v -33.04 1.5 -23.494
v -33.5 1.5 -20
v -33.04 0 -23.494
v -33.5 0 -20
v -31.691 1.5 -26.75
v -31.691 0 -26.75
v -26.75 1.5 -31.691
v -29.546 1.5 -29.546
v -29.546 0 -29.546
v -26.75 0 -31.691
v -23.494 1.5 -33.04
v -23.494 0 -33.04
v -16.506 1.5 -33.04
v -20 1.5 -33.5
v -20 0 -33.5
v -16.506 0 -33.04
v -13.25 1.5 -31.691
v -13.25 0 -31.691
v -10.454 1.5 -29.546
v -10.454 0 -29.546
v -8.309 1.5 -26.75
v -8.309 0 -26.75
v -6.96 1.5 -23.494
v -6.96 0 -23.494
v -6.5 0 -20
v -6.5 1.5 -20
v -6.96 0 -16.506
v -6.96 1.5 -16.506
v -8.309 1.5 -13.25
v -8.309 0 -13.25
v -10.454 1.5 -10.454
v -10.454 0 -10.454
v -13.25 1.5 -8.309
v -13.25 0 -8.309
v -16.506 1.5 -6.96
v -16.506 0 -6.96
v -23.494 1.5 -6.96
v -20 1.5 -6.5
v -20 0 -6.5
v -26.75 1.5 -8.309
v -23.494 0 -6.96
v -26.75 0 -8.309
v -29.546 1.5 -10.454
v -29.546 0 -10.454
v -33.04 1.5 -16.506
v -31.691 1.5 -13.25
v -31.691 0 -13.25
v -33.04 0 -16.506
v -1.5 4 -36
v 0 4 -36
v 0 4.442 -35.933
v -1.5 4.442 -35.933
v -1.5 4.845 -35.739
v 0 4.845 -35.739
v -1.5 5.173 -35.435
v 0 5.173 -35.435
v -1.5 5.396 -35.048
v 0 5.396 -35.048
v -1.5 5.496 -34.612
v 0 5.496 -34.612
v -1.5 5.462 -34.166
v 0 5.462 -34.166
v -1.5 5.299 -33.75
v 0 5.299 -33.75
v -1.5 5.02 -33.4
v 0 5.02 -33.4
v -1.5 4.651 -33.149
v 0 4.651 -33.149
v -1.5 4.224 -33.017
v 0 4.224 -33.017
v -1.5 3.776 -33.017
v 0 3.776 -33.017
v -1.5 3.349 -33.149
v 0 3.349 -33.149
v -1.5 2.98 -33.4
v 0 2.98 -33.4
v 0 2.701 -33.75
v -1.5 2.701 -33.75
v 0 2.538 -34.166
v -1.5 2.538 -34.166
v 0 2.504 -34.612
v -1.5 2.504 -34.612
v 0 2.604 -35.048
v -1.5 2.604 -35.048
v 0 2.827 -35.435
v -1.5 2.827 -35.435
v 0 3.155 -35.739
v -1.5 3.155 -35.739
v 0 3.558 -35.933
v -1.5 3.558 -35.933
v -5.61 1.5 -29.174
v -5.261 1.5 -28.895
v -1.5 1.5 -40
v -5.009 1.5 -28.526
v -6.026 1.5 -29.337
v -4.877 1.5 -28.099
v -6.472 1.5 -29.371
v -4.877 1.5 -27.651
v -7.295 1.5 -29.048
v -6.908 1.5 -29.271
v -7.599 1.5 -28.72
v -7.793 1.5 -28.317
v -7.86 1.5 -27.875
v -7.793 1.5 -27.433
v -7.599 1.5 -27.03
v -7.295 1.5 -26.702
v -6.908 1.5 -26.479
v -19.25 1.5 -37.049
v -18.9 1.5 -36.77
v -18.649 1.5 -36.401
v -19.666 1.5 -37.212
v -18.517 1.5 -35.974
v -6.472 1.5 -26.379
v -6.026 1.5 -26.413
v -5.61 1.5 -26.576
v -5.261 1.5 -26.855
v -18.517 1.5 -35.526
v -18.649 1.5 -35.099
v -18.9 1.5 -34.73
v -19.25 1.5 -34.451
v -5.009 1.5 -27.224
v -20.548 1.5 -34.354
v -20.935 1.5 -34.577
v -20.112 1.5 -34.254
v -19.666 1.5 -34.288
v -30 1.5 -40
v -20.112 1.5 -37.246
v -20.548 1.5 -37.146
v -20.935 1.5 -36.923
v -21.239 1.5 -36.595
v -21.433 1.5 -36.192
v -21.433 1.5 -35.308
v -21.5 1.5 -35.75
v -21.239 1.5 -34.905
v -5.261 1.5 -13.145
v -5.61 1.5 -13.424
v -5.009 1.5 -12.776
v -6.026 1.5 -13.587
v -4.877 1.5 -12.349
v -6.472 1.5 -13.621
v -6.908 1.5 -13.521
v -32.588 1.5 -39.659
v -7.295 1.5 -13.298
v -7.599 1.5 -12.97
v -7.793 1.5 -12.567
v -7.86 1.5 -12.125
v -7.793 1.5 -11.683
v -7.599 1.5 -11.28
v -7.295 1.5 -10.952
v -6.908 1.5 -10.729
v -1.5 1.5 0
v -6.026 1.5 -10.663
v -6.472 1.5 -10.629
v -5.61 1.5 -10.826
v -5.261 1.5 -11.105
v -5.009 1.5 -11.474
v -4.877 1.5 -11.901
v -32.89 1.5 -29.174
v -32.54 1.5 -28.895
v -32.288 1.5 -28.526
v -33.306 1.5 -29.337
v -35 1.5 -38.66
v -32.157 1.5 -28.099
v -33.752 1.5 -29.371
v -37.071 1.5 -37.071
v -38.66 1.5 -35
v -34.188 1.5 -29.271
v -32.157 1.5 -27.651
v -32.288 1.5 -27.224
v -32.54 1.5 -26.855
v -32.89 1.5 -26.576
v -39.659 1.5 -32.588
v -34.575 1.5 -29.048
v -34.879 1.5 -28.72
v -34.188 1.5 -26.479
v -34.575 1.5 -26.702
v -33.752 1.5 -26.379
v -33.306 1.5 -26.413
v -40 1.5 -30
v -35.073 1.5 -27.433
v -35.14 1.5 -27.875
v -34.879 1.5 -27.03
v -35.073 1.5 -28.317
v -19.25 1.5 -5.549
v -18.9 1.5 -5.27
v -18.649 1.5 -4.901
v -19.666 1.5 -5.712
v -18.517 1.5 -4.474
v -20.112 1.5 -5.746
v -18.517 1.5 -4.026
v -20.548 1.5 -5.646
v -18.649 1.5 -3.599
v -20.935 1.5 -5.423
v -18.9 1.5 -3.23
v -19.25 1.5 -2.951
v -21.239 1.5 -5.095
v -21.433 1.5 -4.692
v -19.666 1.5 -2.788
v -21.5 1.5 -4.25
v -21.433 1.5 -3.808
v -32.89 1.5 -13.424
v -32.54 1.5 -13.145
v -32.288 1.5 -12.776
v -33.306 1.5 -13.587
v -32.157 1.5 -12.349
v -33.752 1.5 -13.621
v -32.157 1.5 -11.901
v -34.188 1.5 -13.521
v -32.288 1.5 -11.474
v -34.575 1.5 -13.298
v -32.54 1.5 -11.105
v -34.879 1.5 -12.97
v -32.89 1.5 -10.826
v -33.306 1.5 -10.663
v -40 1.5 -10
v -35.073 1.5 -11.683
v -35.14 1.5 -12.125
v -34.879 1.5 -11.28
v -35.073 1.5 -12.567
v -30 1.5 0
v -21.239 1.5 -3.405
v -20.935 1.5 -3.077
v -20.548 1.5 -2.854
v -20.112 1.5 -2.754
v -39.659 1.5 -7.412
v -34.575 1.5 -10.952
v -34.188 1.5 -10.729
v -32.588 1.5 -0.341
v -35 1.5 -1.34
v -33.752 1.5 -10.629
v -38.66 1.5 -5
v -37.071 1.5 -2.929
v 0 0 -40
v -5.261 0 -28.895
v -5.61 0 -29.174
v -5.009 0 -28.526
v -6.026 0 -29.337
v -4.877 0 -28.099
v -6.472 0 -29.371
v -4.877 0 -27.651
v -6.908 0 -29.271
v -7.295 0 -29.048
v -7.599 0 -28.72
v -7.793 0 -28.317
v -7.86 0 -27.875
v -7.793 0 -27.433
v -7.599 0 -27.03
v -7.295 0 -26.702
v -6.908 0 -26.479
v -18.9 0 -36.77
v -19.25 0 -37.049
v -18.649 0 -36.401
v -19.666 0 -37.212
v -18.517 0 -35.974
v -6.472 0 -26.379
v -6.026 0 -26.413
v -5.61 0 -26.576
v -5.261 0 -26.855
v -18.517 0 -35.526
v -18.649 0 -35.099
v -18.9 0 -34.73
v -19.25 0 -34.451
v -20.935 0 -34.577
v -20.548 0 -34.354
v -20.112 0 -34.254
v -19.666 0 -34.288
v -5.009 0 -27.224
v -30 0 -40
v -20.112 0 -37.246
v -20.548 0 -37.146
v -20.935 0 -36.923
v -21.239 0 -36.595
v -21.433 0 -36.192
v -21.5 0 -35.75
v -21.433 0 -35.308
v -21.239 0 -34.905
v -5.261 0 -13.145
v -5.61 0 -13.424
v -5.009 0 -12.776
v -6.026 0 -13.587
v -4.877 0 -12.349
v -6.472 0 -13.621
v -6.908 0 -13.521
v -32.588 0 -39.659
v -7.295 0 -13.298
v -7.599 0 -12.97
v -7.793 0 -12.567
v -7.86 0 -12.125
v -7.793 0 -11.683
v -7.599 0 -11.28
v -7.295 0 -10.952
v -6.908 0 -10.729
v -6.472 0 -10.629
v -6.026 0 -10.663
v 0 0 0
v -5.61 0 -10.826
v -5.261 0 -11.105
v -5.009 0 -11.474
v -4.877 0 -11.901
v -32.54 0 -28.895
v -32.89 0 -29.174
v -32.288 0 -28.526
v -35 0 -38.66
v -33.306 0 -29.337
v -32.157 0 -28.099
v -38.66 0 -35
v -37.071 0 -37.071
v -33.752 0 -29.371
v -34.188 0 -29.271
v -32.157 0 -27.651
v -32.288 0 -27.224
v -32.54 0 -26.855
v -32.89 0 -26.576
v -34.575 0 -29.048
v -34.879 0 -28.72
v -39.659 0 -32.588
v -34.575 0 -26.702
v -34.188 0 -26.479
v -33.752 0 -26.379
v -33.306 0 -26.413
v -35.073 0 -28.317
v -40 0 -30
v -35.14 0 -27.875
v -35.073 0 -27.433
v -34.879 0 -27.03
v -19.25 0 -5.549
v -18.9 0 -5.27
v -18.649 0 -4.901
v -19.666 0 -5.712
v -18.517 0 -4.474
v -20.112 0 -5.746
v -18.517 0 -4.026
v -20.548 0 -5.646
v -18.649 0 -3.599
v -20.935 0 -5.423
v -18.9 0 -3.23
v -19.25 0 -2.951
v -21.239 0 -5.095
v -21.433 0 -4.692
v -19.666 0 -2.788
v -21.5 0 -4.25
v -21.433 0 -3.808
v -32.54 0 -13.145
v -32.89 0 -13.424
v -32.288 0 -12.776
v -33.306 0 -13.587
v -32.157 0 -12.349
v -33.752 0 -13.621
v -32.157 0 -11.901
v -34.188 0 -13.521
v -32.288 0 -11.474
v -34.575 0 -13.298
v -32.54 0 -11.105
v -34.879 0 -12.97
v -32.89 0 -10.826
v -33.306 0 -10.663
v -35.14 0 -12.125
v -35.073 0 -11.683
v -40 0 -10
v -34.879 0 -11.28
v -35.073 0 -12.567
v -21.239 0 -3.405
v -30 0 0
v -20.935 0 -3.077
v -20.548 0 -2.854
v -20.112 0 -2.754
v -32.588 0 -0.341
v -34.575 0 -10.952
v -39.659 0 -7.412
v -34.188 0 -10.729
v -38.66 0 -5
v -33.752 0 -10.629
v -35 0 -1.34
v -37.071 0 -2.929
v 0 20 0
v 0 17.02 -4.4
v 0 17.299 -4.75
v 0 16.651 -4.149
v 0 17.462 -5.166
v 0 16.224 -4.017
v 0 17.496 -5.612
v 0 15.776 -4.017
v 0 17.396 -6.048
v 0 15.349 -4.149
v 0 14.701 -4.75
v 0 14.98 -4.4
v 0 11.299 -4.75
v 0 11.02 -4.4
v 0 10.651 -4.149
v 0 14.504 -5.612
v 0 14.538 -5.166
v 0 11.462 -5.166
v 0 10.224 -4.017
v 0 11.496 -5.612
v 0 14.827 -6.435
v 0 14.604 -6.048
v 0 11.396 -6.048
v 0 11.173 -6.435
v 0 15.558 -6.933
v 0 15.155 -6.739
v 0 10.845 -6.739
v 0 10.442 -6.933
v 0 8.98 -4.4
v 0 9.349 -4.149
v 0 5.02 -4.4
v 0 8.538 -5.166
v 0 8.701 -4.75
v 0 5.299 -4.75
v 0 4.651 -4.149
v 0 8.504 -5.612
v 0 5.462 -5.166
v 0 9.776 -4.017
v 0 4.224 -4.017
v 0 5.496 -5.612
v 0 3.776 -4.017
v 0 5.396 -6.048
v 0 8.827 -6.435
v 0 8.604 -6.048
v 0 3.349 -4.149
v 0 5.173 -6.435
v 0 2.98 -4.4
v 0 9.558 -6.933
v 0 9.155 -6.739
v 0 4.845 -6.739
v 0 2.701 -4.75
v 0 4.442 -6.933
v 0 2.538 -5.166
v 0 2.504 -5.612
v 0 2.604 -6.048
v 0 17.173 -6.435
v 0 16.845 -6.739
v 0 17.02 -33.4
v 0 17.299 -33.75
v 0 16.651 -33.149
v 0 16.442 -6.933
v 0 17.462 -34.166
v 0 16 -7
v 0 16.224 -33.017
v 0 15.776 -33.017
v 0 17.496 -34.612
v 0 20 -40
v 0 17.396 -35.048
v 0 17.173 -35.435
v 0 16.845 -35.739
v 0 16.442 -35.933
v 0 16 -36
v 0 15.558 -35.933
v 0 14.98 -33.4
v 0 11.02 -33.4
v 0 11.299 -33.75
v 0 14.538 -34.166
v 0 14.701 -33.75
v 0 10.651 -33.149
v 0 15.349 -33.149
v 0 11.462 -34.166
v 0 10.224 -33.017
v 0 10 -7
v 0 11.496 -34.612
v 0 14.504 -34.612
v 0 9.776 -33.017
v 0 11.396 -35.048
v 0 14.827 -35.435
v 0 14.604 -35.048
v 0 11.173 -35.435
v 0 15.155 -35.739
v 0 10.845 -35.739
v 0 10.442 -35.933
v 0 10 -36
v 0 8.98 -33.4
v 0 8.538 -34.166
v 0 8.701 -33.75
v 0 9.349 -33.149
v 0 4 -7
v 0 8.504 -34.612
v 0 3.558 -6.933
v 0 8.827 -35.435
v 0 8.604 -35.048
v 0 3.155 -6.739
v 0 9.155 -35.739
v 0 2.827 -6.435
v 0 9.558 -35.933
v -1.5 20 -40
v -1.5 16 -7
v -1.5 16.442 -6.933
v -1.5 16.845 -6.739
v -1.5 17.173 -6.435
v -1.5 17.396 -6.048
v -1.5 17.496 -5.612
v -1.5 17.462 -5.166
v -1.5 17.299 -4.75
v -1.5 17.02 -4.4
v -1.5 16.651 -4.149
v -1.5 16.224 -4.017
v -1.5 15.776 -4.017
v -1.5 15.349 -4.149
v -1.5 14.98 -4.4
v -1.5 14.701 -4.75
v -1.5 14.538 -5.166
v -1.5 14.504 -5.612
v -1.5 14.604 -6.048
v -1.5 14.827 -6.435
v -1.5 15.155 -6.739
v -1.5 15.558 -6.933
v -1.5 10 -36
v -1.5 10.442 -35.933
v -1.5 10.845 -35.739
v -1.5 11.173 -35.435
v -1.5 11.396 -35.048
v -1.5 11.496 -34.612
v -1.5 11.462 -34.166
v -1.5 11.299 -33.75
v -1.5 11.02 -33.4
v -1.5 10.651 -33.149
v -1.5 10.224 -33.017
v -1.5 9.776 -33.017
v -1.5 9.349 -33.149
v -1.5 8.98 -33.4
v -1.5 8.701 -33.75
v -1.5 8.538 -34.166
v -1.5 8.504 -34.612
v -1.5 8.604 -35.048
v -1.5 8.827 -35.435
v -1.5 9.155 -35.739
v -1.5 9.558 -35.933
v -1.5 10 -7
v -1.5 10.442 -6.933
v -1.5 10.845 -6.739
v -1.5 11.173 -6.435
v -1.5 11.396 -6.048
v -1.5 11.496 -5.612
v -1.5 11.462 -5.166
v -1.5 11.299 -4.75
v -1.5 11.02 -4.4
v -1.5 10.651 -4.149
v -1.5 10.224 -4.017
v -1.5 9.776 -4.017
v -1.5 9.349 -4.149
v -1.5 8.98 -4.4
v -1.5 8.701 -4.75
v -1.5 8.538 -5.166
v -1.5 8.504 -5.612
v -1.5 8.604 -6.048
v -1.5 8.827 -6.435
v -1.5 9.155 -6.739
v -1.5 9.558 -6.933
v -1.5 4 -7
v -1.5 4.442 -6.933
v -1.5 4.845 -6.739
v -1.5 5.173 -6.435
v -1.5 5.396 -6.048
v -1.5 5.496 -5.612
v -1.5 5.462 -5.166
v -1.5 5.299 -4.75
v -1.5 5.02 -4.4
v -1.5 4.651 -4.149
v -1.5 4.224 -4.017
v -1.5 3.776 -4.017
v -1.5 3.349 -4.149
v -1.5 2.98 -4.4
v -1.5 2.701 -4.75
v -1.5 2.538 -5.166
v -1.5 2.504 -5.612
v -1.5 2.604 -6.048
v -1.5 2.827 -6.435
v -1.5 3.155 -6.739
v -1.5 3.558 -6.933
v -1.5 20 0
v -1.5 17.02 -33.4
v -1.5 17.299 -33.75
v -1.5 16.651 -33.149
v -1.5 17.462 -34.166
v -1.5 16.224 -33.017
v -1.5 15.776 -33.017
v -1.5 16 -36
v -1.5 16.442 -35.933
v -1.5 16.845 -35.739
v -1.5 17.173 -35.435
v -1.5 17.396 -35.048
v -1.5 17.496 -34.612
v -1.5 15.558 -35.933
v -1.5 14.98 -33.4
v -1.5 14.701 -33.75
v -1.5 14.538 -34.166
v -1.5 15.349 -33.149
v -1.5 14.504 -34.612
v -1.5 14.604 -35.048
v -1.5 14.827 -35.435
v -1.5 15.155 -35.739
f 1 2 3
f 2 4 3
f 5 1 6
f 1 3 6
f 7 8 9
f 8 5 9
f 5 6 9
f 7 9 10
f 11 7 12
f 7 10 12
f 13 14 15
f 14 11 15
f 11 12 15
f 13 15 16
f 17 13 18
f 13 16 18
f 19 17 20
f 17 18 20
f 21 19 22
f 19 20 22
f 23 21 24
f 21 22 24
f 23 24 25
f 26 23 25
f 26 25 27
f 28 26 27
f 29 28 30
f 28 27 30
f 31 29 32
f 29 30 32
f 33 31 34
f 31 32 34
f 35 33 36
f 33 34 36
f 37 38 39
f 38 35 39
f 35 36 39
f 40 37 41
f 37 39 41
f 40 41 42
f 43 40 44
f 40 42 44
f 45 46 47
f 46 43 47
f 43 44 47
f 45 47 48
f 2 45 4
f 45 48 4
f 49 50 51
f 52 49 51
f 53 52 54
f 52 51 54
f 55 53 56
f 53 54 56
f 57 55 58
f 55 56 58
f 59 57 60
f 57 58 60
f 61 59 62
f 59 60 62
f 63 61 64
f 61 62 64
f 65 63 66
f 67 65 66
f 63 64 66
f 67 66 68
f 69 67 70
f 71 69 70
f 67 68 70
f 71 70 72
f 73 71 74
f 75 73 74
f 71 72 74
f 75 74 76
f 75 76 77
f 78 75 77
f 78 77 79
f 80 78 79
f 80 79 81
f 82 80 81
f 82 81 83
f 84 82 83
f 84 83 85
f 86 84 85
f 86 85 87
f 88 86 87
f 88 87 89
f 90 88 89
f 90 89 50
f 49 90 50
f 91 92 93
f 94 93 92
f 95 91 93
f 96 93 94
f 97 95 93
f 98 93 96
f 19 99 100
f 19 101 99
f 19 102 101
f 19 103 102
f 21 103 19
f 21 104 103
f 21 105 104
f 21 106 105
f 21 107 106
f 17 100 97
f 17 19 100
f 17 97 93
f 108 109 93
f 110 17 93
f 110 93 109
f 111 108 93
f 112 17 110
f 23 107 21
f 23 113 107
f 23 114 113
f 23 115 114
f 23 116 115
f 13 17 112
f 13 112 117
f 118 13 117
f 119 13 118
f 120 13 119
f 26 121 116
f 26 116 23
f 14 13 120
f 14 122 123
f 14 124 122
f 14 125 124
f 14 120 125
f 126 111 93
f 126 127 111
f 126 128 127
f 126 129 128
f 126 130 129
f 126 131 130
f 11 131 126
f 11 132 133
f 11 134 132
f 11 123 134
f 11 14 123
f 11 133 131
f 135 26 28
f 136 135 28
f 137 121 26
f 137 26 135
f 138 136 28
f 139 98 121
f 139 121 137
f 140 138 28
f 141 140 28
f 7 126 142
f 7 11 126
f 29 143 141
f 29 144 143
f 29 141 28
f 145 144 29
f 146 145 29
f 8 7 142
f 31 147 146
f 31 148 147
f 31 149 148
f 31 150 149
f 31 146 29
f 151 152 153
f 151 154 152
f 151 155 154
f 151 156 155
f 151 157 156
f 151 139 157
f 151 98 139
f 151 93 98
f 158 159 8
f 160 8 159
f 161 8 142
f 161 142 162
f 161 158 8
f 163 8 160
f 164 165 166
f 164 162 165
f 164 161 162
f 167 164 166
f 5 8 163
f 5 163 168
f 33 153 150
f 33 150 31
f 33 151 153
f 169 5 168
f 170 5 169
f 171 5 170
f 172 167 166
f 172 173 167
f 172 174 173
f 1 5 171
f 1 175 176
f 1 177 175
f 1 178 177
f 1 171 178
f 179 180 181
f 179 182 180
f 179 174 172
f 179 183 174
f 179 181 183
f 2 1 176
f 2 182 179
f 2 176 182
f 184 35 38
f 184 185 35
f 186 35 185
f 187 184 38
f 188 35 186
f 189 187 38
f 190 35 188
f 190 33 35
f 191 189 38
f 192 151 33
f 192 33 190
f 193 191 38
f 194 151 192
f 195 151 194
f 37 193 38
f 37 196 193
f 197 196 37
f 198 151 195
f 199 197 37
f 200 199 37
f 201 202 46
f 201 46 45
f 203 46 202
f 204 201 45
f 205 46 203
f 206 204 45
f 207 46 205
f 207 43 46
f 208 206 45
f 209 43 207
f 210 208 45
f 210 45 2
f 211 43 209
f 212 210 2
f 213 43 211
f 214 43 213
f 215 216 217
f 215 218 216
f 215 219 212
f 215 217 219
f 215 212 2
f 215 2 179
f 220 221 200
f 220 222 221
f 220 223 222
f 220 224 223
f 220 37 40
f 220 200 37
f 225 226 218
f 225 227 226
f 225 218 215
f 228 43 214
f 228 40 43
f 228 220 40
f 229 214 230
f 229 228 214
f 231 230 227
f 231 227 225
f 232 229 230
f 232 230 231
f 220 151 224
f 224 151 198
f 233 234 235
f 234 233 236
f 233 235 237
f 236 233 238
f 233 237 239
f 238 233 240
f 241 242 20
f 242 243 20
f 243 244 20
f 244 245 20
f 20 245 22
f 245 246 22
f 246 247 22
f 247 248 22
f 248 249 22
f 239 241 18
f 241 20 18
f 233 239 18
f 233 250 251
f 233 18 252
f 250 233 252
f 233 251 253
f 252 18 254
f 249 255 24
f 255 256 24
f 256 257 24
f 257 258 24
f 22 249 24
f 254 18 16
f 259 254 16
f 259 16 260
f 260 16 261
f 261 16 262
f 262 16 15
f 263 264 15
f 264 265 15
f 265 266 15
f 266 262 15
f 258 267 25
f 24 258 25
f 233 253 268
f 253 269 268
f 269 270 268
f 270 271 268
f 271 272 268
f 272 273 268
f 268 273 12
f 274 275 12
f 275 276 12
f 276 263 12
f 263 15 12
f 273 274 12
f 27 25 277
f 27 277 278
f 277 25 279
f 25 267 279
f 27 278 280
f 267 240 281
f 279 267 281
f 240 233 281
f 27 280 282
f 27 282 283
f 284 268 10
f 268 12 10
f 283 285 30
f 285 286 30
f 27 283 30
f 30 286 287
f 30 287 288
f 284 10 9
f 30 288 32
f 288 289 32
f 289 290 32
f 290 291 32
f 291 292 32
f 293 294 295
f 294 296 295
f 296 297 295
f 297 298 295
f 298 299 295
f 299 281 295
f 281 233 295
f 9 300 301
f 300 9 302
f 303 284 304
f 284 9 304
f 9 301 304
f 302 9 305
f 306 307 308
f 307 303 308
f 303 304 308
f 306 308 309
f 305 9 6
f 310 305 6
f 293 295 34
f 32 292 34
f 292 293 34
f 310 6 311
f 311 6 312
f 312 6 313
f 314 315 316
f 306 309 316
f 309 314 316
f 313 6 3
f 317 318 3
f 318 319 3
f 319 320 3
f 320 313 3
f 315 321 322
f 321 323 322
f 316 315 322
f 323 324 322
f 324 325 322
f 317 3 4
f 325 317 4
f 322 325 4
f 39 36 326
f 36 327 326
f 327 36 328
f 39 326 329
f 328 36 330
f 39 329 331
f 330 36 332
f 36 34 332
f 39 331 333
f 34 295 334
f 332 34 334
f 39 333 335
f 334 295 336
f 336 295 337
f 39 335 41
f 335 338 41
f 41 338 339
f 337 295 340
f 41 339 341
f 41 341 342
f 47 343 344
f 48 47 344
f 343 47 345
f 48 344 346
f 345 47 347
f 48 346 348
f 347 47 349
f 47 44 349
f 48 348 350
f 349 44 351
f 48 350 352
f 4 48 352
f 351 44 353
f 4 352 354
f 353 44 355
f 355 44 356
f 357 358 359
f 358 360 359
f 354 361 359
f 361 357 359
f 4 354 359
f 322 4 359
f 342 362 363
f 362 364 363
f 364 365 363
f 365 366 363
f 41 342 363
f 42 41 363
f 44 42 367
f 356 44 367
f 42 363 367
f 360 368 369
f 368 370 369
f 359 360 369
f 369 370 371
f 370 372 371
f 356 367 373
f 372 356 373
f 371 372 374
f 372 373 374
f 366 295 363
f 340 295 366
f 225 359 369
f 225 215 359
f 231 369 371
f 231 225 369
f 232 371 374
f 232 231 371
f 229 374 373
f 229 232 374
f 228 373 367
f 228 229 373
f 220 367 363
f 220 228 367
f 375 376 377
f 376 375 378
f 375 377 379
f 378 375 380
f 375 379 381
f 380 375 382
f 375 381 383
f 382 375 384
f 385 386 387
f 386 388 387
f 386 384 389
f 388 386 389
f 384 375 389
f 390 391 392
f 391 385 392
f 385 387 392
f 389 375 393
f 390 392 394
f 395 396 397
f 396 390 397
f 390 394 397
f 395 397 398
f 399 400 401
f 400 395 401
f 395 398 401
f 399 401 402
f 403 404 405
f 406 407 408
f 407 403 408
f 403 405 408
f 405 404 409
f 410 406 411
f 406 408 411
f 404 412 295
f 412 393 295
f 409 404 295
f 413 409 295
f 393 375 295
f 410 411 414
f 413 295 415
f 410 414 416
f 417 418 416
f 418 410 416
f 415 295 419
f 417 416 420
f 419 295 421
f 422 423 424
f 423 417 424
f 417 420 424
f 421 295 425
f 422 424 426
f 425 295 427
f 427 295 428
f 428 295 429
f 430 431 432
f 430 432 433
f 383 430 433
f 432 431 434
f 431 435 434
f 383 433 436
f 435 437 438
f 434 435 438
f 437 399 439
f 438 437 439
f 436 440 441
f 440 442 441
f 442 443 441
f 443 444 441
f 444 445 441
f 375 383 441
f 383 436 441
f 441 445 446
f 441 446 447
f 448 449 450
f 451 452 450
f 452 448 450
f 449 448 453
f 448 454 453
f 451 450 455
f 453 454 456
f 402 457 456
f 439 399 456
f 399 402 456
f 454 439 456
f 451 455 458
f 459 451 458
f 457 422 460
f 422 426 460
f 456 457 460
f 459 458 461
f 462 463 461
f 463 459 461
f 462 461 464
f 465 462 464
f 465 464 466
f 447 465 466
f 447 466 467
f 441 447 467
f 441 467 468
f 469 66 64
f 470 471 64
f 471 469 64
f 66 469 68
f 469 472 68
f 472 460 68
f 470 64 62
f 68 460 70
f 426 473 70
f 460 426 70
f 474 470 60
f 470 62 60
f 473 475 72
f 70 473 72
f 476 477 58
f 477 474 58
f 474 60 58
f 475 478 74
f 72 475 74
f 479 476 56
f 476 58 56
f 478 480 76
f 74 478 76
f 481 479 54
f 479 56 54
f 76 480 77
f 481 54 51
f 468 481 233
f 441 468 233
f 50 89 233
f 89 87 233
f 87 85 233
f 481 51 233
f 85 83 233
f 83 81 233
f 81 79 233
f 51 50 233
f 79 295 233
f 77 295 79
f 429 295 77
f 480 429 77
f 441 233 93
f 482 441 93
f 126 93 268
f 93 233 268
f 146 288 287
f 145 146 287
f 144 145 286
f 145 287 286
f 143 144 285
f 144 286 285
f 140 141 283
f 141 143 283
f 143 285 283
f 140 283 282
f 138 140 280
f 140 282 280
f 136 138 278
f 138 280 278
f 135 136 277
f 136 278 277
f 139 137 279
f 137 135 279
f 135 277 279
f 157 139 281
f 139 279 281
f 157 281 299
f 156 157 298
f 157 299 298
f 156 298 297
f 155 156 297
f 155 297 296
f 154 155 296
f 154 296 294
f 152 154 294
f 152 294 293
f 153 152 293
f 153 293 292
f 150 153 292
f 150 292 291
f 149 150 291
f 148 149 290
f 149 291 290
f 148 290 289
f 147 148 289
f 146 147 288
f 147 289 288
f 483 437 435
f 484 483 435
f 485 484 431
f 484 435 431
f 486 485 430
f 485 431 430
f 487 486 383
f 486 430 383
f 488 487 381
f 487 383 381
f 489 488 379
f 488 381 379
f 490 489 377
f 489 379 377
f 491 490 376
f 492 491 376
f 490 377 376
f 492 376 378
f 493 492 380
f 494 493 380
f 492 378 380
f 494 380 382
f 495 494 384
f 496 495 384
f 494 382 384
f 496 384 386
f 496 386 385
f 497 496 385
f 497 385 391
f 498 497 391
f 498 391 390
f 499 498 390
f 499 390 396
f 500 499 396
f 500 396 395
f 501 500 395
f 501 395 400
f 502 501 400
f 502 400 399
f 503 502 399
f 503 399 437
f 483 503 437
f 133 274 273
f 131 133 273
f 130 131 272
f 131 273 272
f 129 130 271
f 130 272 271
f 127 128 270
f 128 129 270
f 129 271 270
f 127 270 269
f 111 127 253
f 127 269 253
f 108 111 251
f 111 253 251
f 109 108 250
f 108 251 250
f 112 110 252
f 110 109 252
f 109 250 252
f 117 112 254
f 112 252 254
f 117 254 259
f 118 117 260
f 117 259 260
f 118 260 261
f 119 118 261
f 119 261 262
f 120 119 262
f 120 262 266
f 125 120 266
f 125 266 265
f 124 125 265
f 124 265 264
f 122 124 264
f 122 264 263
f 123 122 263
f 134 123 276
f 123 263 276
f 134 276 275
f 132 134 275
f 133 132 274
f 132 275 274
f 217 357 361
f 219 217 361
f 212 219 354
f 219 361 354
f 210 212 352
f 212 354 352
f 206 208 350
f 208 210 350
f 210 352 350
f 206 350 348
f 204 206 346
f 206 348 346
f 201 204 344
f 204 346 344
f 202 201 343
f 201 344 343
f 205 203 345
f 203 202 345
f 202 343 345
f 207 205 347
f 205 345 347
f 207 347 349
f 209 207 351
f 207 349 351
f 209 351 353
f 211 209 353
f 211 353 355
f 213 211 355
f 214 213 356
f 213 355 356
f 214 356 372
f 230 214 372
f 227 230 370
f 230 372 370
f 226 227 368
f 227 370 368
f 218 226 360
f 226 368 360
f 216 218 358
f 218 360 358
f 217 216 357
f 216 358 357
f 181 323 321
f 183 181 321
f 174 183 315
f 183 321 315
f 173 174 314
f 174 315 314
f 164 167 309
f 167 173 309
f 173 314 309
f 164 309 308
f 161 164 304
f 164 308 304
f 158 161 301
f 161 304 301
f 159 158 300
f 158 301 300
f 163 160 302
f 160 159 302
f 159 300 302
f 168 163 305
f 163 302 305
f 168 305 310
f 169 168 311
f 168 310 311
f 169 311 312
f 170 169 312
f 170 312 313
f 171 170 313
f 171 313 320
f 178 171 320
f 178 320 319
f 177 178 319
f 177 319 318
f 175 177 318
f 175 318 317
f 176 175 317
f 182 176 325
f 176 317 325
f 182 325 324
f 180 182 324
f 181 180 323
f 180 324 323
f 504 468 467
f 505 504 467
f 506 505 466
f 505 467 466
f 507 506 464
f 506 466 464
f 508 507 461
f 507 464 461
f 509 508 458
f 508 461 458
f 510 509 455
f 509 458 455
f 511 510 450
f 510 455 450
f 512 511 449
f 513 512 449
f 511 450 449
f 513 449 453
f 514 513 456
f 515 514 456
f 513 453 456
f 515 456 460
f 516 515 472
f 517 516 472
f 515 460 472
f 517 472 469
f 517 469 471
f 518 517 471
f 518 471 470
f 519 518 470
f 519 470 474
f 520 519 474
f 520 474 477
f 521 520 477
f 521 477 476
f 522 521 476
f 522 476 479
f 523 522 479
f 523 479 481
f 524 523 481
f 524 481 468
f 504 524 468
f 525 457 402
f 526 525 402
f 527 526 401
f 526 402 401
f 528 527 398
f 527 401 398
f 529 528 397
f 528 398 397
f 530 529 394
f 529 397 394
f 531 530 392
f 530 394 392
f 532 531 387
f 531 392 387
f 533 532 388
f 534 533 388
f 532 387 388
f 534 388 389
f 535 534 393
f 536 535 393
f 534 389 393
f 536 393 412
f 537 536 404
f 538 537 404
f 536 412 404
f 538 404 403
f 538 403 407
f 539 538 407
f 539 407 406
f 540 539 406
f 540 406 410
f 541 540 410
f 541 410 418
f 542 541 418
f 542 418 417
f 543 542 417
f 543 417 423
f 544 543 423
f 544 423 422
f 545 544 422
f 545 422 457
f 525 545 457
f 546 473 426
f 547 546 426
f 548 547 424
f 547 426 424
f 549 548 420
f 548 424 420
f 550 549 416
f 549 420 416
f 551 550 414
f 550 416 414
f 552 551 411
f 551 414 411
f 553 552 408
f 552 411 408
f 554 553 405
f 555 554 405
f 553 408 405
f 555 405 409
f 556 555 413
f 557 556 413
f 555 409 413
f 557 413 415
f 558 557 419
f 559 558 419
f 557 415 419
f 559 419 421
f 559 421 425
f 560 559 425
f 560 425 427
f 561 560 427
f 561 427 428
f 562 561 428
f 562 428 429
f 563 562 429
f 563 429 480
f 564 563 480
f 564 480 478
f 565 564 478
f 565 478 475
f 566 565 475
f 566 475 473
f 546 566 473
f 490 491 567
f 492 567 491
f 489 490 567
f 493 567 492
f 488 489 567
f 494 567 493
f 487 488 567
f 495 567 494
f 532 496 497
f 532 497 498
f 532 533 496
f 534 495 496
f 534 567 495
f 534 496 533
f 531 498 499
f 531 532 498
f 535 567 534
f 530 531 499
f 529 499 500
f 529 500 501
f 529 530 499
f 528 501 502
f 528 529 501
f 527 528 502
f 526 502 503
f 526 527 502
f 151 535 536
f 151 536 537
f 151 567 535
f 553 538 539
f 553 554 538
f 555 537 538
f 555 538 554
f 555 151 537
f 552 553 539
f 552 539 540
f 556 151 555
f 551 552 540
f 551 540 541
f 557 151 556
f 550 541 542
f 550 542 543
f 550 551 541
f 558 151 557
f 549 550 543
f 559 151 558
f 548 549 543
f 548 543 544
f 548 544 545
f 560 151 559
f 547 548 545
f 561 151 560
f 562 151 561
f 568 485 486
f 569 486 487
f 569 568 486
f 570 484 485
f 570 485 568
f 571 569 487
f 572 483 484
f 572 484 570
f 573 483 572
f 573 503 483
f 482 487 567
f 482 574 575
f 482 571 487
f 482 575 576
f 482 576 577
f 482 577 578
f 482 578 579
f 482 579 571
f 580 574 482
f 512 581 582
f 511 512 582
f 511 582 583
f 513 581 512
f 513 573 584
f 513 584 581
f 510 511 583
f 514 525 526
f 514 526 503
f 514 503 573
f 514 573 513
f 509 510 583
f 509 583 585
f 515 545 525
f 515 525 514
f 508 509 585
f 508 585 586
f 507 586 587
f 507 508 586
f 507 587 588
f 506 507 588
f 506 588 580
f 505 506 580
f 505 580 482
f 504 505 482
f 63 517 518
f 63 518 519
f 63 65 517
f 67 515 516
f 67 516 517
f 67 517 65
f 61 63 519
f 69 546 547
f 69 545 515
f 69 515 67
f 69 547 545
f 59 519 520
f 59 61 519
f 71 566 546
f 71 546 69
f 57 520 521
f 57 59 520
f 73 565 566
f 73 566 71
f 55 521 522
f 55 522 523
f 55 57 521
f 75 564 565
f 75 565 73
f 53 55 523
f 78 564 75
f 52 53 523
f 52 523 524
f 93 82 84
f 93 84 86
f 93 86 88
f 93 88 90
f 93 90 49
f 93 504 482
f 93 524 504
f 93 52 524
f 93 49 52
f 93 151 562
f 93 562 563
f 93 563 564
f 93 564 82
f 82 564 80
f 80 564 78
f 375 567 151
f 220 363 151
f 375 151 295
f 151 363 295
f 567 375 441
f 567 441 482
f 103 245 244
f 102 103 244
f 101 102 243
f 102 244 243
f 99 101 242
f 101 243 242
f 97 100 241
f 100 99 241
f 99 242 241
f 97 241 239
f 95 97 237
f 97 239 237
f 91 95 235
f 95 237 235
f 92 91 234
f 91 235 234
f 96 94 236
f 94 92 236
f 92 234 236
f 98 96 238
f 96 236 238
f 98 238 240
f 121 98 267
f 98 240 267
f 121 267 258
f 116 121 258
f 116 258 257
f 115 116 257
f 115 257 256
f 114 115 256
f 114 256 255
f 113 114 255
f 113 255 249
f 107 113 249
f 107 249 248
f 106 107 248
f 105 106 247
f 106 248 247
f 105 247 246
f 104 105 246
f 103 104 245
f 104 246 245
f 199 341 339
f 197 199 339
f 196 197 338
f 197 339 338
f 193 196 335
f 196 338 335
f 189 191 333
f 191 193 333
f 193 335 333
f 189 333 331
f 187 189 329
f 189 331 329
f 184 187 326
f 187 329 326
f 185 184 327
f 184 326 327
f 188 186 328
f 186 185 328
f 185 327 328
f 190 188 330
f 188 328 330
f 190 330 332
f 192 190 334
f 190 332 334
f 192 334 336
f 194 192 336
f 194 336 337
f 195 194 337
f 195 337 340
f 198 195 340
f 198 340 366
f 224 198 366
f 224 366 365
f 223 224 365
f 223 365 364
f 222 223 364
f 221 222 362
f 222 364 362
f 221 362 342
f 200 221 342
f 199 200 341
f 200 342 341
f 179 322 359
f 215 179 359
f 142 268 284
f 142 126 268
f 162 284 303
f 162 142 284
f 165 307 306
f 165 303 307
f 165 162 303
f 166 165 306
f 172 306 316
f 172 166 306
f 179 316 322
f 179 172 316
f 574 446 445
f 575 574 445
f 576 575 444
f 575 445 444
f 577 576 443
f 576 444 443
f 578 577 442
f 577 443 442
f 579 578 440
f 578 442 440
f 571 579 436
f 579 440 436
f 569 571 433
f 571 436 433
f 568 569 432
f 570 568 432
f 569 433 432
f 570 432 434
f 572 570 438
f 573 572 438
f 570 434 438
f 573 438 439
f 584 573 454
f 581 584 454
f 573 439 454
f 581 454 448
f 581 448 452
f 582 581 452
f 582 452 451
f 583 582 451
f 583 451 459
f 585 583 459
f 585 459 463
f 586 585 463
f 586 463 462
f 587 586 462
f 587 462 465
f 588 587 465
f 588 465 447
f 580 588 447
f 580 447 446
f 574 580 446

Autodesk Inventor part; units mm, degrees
ref_plane "YZ Plane" through (0, 0, 0) normal (1, 0, 0) x (0, 1, 0)
ref_plane "XZ Plane" through (0, 0, 0) normal (0, 1, 0) x (-1, 0, 0)
ref_plane "XY Plane" through (0, 0, 0) normal (0, 0, 1) x (1, 0, 0)
sketch "Sketch1" plane through (0, 0, 0) normal (0, 1, 0) x (-1, 0, 0)
  line L0 (0, 0) -> (0, -40)
  line L1 (0, -40) -> (40, -40)
  line L2 (40, -40) -> (40, 0)
  line L3 (40, 0) -> (0, 0)
  line L4 (0, 0) -> (1.5, 0)
  line L5 (1.5, 0) -> (1.5, -40)
  line L6 (1.5, -40) -> (0, -40)
  circle A0 centre (20, -20) radius 13.5
  circle A1 centre (20, -4.25) radius 1.5
  circle A2 centre (33.6399, -12.125) radius 1.5
  circle A3 centre (33.6399, -27.875) radius 1.5
  circle A4 centre (20, -35.75) radius 1.5
  circle A5 centre (6.3601, -27.875) radius 1.5
  circle A6 centre (6.3601, -12.125) radius 1.5
  dimension "d0" = 40
  dimension "d2" = 1.5
  dimension "d7" = 3
  dimension "d8" = 3
  dimension "d9" = 3
  dimension "d10" = 3
  dimension "d11" = 3
  dimension "d12" = 3
extrude "Extrusion1" add sketch "Sketch1" along normal blind 1.5 contours L3 L2 L1 L5
extrude "Extrusion2" add sketch "Sketch1" along normal blind 20 contours L3 L5 L1 L0
sketch "Sketch2" plane through (0, 0, 0) normal (1, 0, 0) x (0, 0, -1)
  line L0 (0, 20) -> (5.5, 20)
  line L1 (0, 20) -> (40, 20) projected
  line L2 (0, 20) -> (34.5, 20)
  line L3 (40, 20) -> (34.5, 20)
  line L4 (34.5, 20) -> (34.5, 16)
  line L5 (34.5, 16) -> (34.5, 10)
  line L6 (34.5, 10) -> (34.5, 4)
  line L7 (5.5, 20) -> (5.5, 16)
  line L8 (5.5, 16) -> (5.5, 10)
  line L9 (5.5, 10) -> (5.5, 4)
  circle A0 centre (5.5, 4) radius 1.5
  circle A1 centre (5.5, 10) radius 1.5
  circle A2 centre (5.5, 16) radius 1.5
  circle A3 centre (34.5, 16) radius 1.5
  circle A4 centre (34.5, 10) radius 1.5
  circle A5 centre (34.5, 4) radius 1.5
  point P0 (0, 0)
  dimension "d17" = 5.5
  dimension "d18" = 34.5
  dimension "d19" = 4
  dimension "d20" = 6
  dimension "d21" = 6
  dimension "d22" = 4
  dimension "d23" = 6
  dimension "d24" = 6
  dimension "d25" = 3
  dimension "d26" = 3
  dimension "d27" = 3
  dimension "d28" = 3
  dimension "d29" = 3
  dimension "d30" = 3
extrude "Extrusion3" cut sketch "Sketch2" against normal blind 5
fillet "Fillet1" radius 10 2 edges at (-40, 0.75, 0) (-40, 0.75, -40)
properties part number "offcenter_L_clamp"
